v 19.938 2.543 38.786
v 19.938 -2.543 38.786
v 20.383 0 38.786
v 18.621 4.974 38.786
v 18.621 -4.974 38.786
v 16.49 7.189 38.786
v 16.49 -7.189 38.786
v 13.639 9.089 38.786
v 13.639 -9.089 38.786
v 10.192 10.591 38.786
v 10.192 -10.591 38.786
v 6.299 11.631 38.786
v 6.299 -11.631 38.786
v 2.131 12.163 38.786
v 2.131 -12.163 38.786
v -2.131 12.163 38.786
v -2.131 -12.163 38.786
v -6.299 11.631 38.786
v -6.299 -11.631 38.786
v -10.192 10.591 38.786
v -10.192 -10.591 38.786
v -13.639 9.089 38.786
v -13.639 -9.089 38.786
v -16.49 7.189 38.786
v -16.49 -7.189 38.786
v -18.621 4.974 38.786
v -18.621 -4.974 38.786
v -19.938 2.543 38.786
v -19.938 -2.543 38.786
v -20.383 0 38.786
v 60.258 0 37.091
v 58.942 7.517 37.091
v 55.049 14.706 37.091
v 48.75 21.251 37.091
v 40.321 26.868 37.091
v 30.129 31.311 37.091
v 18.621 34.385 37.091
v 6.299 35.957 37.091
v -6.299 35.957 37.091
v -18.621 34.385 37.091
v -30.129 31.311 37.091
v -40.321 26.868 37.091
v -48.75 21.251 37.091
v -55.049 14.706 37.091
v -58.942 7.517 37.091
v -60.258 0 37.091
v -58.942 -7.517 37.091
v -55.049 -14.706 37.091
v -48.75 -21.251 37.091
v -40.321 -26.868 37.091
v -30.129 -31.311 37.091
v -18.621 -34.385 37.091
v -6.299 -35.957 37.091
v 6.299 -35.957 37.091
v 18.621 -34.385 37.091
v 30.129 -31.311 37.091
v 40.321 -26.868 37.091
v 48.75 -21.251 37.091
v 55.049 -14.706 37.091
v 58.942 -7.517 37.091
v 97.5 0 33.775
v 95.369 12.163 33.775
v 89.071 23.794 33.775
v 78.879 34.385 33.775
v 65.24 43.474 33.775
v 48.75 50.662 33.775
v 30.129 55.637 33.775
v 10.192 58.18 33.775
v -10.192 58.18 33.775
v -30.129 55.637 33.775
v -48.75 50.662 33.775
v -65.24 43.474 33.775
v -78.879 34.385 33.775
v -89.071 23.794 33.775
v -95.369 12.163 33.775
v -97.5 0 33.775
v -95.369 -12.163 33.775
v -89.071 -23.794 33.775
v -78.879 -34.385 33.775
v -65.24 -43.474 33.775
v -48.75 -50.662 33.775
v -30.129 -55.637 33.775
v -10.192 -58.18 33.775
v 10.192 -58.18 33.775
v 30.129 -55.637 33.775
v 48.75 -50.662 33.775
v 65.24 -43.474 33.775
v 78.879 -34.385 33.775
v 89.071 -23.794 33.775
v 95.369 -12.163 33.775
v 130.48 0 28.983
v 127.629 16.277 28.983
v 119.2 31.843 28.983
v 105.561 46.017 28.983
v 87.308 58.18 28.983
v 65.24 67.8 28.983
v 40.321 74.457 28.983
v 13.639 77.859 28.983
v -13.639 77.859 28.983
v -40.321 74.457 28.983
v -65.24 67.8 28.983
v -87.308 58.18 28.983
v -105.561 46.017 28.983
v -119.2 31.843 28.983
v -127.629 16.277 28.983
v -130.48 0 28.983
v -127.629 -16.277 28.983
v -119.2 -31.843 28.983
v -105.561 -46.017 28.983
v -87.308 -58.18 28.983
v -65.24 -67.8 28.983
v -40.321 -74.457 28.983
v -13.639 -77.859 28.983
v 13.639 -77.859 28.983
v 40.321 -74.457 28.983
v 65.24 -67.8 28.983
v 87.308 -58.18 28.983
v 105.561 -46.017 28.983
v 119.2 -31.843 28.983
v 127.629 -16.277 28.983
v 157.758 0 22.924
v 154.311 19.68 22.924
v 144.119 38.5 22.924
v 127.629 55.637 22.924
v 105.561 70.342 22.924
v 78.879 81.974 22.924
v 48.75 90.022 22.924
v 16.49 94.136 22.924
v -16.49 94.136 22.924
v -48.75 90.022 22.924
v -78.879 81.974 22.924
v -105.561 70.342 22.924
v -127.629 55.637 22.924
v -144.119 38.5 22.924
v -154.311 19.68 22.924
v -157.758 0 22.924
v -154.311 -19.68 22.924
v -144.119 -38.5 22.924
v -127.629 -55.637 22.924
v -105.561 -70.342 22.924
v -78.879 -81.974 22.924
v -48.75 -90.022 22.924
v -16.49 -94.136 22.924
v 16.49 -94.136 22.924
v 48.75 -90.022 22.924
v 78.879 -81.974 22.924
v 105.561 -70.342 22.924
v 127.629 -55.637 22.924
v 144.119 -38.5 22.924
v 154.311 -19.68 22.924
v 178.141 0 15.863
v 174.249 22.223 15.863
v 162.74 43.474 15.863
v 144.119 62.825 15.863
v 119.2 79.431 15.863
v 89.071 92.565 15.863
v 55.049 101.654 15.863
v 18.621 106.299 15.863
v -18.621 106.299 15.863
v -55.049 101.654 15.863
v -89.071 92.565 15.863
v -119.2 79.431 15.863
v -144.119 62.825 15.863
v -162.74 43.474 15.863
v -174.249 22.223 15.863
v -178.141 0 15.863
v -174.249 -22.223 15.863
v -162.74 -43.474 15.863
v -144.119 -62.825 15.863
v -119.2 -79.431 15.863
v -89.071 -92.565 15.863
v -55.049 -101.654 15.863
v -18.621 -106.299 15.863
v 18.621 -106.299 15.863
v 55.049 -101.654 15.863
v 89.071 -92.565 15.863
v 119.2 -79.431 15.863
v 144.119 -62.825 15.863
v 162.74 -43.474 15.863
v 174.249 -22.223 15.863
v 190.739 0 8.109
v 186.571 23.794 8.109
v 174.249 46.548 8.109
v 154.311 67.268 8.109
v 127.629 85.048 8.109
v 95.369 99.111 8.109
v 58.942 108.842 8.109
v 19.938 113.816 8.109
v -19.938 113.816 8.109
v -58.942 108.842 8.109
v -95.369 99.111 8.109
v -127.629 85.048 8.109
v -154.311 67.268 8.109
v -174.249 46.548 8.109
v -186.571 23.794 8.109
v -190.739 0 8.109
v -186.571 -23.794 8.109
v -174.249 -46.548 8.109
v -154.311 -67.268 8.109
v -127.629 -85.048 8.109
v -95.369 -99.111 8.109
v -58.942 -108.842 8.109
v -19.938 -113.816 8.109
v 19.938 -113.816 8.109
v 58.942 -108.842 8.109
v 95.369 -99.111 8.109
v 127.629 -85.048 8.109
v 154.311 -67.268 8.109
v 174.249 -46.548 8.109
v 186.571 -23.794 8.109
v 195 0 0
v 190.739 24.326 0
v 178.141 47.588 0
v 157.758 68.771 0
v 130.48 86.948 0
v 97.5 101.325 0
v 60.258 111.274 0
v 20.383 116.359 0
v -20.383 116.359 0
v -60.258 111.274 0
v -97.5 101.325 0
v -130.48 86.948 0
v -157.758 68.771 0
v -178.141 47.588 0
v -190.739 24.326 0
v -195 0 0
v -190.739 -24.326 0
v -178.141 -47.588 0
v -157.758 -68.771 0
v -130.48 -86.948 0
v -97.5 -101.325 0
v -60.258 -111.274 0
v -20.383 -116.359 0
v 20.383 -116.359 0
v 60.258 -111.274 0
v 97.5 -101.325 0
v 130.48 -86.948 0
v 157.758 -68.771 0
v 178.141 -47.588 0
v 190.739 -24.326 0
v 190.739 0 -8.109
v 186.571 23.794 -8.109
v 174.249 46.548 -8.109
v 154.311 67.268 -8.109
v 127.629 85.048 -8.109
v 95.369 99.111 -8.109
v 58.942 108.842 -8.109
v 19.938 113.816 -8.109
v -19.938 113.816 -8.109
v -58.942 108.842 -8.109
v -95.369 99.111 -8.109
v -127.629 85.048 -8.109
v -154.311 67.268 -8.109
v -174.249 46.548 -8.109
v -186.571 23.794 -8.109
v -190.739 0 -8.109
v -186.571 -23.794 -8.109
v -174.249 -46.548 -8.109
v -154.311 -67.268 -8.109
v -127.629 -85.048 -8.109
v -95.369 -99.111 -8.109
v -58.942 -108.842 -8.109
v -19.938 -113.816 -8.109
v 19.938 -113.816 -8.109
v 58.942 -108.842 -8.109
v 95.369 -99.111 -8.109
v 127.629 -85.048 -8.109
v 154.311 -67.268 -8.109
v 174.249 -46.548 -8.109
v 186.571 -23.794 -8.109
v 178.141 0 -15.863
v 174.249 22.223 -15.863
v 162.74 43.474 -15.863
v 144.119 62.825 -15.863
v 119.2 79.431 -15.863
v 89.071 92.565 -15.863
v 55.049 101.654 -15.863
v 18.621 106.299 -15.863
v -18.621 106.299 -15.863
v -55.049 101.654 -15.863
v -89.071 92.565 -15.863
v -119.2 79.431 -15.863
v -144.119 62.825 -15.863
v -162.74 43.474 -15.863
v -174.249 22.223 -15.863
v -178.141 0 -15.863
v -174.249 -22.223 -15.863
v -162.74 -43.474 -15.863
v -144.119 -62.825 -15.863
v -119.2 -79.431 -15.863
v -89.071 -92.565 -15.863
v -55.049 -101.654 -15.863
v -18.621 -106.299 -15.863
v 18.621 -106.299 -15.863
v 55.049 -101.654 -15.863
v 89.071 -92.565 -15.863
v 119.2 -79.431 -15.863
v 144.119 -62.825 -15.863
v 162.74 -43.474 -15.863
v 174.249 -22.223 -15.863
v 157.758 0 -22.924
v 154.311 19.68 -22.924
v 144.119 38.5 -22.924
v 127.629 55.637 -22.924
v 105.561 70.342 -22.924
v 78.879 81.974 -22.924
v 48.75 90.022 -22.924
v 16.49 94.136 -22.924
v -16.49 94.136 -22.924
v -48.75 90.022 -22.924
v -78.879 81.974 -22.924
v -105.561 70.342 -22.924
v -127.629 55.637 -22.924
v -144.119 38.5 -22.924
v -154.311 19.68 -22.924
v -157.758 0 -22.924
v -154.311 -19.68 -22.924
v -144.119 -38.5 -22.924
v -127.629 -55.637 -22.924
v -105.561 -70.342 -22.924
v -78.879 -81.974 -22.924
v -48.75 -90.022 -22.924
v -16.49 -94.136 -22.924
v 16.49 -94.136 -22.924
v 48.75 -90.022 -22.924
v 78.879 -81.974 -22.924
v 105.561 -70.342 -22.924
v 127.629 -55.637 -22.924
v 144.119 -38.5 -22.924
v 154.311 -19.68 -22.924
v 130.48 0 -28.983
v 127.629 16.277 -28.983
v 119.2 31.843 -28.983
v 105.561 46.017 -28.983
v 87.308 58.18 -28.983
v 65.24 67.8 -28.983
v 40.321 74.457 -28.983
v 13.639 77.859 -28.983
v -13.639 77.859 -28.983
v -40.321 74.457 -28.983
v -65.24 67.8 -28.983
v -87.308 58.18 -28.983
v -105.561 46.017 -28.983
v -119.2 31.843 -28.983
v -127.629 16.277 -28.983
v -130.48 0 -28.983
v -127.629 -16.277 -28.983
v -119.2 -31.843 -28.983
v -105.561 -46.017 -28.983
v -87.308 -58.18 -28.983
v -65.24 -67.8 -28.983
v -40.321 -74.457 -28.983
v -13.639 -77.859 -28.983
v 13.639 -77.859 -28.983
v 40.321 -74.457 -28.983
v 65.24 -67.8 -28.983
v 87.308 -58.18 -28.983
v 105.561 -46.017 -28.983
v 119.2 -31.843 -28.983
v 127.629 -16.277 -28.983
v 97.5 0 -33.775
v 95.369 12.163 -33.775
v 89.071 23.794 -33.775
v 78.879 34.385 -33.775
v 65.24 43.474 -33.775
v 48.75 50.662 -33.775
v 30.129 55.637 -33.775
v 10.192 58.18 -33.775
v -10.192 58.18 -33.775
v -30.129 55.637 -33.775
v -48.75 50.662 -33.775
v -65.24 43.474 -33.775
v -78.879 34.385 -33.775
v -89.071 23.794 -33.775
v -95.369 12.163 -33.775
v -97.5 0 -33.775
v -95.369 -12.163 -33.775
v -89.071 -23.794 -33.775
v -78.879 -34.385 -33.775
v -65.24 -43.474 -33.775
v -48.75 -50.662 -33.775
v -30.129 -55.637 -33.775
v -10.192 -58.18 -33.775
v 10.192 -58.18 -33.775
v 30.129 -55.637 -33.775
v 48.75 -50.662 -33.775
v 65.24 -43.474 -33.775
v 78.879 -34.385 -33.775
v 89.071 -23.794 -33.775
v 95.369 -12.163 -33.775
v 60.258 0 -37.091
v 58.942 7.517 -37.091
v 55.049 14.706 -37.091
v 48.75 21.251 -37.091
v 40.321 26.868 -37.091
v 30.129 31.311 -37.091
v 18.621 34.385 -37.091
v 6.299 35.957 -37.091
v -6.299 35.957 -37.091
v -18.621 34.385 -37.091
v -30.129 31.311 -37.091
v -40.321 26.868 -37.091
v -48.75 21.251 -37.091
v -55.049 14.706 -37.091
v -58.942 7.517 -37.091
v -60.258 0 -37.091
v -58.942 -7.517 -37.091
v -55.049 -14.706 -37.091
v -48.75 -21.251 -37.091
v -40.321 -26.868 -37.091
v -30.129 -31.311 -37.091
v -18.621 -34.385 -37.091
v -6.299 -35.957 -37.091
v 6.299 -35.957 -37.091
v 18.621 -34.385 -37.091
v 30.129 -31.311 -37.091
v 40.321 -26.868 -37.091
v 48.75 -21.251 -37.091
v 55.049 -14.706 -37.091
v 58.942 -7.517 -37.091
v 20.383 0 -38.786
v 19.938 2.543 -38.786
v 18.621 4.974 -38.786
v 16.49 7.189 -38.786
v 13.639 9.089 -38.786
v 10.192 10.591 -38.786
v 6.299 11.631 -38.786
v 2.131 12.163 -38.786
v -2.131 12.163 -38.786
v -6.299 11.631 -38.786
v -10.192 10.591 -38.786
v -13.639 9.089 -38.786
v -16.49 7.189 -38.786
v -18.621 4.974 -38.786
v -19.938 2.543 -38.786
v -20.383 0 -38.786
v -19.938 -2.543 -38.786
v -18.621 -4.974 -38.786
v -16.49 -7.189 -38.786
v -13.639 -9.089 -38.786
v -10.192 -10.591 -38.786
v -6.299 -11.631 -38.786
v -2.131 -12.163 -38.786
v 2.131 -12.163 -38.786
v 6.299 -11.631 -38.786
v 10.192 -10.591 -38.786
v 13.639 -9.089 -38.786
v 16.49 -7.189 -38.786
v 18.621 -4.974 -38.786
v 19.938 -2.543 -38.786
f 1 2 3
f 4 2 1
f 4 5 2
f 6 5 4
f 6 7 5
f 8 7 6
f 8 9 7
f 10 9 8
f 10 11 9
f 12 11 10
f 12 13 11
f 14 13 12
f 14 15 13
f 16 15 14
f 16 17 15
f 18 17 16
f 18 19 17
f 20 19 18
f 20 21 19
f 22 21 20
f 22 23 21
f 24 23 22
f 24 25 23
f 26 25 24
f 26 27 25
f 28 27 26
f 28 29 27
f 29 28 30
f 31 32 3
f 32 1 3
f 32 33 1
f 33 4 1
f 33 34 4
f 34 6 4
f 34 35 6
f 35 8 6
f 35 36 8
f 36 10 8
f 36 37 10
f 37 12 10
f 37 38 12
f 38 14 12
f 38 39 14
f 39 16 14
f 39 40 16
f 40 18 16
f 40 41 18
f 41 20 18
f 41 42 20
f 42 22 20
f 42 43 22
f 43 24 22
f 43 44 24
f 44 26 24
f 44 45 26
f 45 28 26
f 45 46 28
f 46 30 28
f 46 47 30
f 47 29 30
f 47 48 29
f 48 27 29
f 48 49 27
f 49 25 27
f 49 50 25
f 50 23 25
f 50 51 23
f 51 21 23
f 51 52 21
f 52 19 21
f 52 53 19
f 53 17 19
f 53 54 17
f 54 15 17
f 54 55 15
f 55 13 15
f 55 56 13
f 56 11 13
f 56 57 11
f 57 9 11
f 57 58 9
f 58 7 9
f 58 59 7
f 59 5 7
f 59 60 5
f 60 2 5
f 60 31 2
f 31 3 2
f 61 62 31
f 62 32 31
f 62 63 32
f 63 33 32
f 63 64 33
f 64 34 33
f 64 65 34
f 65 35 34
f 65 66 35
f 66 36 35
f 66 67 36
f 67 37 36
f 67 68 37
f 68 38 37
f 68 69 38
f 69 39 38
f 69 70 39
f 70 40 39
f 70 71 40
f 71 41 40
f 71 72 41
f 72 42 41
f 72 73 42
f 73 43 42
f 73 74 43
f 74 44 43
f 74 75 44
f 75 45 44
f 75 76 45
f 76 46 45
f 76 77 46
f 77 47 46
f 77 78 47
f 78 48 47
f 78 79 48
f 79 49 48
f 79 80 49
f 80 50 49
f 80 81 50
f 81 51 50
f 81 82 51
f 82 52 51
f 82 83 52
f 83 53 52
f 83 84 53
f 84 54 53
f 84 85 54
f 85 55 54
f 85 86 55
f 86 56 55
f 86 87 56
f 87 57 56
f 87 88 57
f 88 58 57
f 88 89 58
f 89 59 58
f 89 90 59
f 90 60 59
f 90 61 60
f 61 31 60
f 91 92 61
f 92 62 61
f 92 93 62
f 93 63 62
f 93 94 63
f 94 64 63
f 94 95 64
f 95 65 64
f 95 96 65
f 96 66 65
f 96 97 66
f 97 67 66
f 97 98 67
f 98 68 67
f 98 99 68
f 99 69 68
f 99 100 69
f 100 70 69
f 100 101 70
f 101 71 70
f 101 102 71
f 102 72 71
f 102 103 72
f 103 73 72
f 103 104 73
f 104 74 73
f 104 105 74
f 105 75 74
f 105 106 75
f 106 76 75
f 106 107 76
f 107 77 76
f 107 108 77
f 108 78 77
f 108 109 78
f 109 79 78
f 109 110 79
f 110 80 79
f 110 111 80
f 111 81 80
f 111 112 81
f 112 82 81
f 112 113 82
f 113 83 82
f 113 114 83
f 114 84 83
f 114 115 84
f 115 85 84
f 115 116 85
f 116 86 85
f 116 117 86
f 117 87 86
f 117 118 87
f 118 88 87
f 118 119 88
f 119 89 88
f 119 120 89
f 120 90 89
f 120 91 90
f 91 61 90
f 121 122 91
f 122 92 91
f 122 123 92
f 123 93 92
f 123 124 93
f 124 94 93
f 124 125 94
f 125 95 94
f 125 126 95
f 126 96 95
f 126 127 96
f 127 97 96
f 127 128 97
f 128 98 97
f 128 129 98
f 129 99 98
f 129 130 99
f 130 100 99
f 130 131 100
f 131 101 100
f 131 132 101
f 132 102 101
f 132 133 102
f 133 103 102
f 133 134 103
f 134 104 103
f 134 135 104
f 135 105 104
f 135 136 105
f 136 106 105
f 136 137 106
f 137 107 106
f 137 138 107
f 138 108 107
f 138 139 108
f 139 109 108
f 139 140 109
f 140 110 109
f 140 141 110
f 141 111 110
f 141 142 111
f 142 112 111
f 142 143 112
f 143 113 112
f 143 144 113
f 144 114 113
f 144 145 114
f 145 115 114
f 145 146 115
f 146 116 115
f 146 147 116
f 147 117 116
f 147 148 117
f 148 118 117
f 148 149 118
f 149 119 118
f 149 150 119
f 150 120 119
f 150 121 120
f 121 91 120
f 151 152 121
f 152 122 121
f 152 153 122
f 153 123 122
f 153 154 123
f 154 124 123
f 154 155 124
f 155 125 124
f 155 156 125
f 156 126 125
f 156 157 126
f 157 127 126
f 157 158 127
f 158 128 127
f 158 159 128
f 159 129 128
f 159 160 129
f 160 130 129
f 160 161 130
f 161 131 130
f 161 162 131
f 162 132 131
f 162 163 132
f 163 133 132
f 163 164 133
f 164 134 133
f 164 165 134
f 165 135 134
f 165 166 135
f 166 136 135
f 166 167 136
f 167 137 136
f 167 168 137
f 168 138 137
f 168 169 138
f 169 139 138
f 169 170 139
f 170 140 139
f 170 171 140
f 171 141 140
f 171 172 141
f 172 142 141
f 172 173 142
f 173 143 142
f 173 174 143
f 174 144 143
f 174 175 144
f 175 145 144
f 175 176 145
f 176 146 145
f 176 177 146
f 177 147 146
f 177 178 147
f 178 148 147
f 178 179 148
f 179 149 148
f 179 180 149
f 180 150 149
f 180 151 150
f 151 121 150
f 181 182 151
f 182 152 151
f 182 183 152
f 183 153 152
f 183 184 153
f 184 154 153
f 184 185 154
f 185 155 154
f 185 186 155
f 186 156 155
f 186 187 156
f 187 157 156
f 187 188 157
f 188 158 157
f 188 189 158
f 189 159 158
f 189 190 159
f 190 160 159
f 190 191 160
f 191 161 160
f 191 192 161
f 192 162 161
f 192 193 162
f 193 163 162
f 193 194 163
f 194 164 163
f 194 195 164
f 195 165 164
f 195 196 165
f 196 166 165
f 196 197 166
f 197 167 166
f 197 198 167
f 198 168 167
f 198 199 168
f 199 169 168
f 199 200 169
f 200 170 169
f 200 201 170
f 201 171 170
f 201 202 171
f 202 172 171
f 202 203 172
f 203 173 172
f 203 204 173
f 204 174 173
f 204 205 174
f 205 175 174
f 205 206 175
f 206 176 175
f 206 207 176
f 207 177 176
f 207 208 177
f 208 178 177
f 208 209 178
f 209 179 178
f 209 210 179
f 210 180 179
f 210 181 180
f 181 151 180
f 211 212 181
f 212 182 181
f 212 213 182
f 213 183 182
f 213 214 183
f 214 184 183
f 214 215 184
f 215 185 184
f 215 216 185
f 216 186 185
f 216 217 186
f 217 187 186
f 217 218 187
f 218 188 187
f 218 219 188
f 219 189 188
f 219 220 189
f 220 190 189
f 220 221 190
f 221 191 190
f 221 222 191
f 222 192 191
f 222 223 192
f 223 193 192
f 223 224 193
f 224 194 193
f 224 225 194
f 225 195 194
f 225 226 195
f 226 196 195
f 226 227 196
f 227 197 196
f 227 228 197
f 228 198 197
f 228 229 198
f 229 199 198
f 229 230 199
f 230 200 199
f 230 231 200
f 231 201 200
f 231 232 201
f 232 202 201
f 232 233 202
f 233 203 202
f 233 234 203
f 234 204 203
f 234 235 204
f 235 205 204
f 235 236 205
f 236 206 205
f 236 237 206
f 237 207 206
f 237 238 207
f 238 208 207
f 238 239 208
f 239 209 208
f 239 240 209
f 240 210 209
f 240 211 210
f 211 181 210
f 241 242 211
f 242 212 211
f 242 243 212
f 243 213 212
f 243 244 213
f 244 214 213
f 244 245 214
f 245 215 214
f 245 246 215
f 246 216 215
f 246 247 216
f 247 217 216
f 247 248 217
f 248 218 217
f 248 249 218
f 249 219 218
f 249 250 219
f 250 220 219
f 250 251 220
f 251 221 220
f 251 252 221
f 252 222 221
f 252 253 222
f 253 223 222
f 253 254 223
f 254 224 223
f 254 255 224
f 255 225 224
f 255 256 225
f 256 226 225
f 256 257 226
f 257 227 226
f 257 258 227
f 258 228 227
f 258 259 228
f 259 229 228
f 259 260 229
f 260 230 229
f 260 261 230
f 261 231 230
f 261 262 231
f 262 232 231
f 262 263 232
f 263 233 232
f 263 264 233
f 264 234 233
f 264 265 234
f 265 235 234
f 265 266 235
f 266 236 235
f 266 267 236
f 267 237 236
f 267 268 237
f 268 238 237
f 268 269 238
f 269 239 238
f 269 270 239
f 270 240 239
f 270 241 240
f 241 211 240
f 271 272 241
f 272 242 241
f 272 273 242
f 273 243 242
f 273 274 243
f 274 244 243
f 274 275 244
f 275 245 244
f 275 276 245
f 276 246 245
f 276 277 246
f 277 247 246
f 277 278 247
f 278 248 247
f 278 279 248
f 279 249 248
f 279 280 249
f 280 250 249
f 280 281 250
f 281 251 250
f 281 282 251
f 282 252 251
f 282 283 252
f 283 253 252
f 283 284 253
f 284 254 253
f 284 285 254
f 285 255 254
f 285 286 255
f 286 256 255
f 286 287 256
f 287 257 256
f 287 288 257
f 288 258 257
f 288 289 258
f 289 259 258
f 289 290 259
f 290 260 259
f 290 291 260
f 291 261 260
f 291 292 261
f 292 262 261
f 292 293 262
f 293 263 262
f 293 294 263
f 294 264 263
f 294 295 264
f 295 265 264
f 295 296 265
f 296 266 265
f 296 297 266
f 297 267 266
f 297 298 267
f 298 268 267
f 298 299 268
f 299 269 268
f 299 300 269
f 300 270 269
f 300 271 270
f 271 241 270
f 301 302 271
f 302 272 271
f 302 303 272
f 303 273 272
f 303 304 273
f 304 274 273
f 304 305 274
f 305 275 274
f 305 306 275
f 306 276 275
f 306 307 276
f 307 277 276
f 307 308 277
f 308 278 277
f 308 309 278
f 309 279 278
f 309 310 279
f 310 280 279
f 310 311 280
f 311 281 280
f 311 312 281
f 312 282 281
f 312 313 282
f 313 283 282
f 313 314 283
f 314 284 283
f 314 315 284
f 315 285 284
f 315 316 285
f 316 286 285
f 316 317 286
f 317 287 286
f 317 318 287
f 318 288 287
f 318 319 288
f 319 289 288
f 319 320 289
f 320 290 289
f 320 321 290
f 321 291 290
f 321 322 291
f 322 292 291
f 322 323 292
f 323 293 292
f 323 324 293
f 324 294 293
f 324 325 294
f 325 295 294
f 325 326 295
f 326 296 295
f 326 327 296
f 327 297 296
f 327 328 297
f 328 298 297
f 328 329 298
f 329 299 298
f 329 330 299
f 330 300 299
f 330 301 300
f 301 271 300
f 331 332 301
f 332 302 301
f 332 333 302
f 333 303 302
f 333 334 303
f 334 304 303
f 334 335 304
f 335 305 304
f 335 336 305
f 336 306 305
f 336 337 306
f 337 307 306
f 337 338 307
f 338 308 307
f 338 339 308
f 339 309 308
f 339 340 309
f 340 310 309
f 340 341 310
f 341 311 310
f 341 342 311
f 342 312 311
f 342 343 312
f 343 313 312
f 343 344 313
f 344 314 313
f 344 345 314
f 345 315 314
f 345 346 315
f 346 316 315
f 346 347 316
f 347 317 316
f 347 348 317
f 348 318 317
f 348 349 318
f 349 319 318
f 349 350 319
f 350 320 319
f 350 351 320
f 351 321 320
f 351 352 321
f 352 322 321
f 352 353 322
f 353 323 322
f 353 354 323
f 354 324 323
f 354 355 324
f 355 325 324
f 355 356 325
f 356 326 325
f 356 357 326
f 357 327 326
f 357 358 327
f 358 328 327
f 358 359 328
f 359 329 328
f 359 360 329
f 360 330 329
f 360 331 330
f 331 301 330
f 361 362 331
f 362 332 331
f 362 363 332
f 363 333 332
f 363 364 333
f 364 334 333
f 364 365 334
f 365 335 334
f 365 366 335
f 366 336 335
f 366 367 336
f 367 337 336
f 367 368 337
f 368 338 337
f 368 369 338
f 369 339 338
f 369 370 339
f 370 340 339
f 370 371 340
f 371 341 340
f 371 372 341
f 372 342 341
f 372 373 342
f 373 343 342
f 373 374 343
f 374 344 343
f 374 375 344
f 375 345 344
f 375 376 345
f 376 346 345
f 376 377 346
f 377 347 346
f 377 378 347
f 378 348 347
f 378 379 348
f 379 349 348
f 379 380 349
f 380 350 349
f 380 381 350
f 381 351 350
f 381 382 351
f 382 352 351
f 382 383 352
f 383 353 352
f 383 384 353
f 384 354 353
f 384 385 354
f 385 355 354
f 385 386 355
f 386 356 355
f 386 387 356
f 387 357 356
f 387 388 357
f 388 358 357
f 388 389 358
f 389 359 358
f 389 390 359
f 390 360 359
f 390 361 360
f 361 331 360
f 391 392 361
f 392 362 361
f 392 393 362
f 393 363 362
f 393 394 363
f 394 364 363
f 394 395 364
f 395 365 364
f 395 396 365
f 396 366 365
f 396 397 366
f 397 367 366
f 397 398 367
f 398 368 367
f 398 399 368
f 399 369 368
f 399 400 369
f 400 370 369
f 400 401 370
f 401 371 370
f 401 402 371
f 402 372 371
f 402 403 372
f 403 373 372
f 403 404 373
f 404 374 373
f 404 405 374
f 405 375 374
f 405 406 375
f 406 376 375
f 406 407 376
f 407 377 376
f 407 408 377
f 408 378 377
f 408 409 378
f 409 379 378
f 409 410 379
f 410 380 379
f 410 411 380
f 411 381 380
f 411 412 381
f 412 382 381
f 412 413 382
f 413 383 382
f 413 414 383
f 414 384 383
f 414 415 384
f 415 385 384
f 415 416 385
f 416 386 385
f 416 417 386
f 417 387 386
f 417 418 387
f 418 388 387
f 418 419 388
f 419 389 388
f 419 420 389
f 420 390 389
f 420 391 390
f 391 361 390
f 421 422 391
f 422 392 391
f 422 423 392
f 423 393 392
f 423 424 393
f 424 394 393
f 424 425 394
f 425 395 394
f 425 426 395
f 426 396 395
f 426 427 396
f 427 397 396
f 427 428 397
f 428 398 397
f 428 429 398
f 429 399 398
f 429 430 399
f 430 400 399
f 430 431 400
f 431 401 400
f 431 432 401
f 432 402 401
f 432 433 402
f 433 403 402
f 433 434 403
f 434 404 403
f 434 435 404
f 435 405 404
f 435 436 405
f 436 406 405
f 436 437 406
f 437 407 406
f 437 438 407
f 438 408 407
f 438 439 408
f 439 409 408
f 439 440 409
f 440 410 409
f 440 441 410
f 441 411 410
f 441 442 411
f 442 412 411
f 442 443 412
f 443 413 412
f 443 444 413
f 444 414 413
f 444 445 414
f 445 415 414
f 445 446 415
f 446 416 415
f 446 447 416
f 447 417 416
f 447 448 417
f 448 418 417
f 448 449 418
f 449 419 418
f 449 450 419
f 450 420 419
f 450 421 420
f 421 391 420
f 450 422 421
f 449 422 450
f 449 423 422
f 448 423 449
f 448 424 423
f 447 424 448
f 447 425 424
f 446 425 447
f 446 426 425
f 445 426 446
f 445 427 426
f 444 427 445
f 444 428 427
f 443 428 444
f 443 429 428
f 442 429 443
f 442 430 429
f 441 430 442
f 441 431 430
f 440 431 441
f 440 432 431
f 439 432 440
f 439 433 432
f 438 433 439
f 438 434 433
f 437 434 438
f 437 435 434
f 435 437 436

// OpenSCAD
// Generated by SolidPython 1.0.1 on 2020-07-29 00:46:51


scale(v = [15, 9, 3]) {
	sphere(r = 13);
}
/***********************************************
*********      SolidPython code:      **********
************************************************
 
# import packages: SolidPython
from solid import *
from solid.utils import *
from itertools import chain, combinations, permutations


class Resize:

    def __init__(self, scad_file):
        self.scad_file = scad_file
        #self.scad_file = import_scad(scad_file)
        # cone/cylinder param:
        self.r1 = 0
        self.r2 = 0
        self.h = 0
        # rectangular prism param:
        self.w = 0
        self.l = 0
        # ellipse param:
        self.r = 0

    # import OpenScad code (file name corresponds to shape)


    # classify shape + parameters
    def assign(self, param1, param2, param3):
        if self.scad_file == 'cone.scad':
            self.r1 = param1
            self.r2 = param2
            self.h = param3
        elif self.scad_file == 'cylinder.scad':
            self.r1 = param1
            self.r2 = param2
            self.h = param3
        elif self.scad_file == 'rectangularPrism.scad':
            self.h = param1
            self.l = param2
            self.w = param3
        else:
            self.r = param1
            self.h = param2

    # resize parameters
    def iterate(self):
        x = range(3, 20, 2)
        i = 1
        if self.scad_file == 'cone.scad':
            tempList = list(permutations(x, 2))
            for temp in tempList:
                param1 = temp[0]
                param2 = temp[1]
                filepath = 'produced_scad_files/' + 'cone' + str(param1) + '_' + str(param2) + '_' + '.scad'
                scad_render_to_file(cylinder(h=param1, r1=param2, r2=0), filepath)

        elif self.scad_file == 'cylinder.scad':
            tempList = list(permutations(x, 3))
            for temp in tempList:
                param1 = temp[0]
                param2 = temp[1]
                filepath = 'produced_scad_files/' + 'cylinder' + str(param1) + '_' + str(param2) + '_' + '.scad'
                scad_render_to_file(cylinder(h=param1, r1=param2, r2=param2), filepath)

        elif self.scad_file == 'rectangularPrism.scad':
            tempList = list(permutations(x, 3))
            for temp in tempList:
                param1 = temp[0]
                param2 = temp[1]
                param3 = temp[2]
                filepath = 'produced_scad_files/' + 'rectangularPrism' + str(param1) + '_' + str(param2) + '_' + str(
                    param3) + '.scad'
                scad_render_to_file(cube(size=(param1, param2, param3)), filepath)

        elif self.scad_file == 'ellipse.scad':
            tempList = list(permutations(x, 4))
            for temp in tempList:
                param1 = temp[0]
                param2 = temp[1]
                param3 = temp[2]
                param4 = temp[3]
                filepath = 'produced_scad_files/' + 'ellipse' + str(param1) + '_' + str(param2) + '_' + str(param3) + '_' + str(param4) + '.scad'
                scad_render_to_file(scale([param1, param2, param3])(sphere(r=param4)), filepath)

    def render_to_scadfile(self):
        scad_render_to_file(scad, 'example.scad') 
 
************************************************/
